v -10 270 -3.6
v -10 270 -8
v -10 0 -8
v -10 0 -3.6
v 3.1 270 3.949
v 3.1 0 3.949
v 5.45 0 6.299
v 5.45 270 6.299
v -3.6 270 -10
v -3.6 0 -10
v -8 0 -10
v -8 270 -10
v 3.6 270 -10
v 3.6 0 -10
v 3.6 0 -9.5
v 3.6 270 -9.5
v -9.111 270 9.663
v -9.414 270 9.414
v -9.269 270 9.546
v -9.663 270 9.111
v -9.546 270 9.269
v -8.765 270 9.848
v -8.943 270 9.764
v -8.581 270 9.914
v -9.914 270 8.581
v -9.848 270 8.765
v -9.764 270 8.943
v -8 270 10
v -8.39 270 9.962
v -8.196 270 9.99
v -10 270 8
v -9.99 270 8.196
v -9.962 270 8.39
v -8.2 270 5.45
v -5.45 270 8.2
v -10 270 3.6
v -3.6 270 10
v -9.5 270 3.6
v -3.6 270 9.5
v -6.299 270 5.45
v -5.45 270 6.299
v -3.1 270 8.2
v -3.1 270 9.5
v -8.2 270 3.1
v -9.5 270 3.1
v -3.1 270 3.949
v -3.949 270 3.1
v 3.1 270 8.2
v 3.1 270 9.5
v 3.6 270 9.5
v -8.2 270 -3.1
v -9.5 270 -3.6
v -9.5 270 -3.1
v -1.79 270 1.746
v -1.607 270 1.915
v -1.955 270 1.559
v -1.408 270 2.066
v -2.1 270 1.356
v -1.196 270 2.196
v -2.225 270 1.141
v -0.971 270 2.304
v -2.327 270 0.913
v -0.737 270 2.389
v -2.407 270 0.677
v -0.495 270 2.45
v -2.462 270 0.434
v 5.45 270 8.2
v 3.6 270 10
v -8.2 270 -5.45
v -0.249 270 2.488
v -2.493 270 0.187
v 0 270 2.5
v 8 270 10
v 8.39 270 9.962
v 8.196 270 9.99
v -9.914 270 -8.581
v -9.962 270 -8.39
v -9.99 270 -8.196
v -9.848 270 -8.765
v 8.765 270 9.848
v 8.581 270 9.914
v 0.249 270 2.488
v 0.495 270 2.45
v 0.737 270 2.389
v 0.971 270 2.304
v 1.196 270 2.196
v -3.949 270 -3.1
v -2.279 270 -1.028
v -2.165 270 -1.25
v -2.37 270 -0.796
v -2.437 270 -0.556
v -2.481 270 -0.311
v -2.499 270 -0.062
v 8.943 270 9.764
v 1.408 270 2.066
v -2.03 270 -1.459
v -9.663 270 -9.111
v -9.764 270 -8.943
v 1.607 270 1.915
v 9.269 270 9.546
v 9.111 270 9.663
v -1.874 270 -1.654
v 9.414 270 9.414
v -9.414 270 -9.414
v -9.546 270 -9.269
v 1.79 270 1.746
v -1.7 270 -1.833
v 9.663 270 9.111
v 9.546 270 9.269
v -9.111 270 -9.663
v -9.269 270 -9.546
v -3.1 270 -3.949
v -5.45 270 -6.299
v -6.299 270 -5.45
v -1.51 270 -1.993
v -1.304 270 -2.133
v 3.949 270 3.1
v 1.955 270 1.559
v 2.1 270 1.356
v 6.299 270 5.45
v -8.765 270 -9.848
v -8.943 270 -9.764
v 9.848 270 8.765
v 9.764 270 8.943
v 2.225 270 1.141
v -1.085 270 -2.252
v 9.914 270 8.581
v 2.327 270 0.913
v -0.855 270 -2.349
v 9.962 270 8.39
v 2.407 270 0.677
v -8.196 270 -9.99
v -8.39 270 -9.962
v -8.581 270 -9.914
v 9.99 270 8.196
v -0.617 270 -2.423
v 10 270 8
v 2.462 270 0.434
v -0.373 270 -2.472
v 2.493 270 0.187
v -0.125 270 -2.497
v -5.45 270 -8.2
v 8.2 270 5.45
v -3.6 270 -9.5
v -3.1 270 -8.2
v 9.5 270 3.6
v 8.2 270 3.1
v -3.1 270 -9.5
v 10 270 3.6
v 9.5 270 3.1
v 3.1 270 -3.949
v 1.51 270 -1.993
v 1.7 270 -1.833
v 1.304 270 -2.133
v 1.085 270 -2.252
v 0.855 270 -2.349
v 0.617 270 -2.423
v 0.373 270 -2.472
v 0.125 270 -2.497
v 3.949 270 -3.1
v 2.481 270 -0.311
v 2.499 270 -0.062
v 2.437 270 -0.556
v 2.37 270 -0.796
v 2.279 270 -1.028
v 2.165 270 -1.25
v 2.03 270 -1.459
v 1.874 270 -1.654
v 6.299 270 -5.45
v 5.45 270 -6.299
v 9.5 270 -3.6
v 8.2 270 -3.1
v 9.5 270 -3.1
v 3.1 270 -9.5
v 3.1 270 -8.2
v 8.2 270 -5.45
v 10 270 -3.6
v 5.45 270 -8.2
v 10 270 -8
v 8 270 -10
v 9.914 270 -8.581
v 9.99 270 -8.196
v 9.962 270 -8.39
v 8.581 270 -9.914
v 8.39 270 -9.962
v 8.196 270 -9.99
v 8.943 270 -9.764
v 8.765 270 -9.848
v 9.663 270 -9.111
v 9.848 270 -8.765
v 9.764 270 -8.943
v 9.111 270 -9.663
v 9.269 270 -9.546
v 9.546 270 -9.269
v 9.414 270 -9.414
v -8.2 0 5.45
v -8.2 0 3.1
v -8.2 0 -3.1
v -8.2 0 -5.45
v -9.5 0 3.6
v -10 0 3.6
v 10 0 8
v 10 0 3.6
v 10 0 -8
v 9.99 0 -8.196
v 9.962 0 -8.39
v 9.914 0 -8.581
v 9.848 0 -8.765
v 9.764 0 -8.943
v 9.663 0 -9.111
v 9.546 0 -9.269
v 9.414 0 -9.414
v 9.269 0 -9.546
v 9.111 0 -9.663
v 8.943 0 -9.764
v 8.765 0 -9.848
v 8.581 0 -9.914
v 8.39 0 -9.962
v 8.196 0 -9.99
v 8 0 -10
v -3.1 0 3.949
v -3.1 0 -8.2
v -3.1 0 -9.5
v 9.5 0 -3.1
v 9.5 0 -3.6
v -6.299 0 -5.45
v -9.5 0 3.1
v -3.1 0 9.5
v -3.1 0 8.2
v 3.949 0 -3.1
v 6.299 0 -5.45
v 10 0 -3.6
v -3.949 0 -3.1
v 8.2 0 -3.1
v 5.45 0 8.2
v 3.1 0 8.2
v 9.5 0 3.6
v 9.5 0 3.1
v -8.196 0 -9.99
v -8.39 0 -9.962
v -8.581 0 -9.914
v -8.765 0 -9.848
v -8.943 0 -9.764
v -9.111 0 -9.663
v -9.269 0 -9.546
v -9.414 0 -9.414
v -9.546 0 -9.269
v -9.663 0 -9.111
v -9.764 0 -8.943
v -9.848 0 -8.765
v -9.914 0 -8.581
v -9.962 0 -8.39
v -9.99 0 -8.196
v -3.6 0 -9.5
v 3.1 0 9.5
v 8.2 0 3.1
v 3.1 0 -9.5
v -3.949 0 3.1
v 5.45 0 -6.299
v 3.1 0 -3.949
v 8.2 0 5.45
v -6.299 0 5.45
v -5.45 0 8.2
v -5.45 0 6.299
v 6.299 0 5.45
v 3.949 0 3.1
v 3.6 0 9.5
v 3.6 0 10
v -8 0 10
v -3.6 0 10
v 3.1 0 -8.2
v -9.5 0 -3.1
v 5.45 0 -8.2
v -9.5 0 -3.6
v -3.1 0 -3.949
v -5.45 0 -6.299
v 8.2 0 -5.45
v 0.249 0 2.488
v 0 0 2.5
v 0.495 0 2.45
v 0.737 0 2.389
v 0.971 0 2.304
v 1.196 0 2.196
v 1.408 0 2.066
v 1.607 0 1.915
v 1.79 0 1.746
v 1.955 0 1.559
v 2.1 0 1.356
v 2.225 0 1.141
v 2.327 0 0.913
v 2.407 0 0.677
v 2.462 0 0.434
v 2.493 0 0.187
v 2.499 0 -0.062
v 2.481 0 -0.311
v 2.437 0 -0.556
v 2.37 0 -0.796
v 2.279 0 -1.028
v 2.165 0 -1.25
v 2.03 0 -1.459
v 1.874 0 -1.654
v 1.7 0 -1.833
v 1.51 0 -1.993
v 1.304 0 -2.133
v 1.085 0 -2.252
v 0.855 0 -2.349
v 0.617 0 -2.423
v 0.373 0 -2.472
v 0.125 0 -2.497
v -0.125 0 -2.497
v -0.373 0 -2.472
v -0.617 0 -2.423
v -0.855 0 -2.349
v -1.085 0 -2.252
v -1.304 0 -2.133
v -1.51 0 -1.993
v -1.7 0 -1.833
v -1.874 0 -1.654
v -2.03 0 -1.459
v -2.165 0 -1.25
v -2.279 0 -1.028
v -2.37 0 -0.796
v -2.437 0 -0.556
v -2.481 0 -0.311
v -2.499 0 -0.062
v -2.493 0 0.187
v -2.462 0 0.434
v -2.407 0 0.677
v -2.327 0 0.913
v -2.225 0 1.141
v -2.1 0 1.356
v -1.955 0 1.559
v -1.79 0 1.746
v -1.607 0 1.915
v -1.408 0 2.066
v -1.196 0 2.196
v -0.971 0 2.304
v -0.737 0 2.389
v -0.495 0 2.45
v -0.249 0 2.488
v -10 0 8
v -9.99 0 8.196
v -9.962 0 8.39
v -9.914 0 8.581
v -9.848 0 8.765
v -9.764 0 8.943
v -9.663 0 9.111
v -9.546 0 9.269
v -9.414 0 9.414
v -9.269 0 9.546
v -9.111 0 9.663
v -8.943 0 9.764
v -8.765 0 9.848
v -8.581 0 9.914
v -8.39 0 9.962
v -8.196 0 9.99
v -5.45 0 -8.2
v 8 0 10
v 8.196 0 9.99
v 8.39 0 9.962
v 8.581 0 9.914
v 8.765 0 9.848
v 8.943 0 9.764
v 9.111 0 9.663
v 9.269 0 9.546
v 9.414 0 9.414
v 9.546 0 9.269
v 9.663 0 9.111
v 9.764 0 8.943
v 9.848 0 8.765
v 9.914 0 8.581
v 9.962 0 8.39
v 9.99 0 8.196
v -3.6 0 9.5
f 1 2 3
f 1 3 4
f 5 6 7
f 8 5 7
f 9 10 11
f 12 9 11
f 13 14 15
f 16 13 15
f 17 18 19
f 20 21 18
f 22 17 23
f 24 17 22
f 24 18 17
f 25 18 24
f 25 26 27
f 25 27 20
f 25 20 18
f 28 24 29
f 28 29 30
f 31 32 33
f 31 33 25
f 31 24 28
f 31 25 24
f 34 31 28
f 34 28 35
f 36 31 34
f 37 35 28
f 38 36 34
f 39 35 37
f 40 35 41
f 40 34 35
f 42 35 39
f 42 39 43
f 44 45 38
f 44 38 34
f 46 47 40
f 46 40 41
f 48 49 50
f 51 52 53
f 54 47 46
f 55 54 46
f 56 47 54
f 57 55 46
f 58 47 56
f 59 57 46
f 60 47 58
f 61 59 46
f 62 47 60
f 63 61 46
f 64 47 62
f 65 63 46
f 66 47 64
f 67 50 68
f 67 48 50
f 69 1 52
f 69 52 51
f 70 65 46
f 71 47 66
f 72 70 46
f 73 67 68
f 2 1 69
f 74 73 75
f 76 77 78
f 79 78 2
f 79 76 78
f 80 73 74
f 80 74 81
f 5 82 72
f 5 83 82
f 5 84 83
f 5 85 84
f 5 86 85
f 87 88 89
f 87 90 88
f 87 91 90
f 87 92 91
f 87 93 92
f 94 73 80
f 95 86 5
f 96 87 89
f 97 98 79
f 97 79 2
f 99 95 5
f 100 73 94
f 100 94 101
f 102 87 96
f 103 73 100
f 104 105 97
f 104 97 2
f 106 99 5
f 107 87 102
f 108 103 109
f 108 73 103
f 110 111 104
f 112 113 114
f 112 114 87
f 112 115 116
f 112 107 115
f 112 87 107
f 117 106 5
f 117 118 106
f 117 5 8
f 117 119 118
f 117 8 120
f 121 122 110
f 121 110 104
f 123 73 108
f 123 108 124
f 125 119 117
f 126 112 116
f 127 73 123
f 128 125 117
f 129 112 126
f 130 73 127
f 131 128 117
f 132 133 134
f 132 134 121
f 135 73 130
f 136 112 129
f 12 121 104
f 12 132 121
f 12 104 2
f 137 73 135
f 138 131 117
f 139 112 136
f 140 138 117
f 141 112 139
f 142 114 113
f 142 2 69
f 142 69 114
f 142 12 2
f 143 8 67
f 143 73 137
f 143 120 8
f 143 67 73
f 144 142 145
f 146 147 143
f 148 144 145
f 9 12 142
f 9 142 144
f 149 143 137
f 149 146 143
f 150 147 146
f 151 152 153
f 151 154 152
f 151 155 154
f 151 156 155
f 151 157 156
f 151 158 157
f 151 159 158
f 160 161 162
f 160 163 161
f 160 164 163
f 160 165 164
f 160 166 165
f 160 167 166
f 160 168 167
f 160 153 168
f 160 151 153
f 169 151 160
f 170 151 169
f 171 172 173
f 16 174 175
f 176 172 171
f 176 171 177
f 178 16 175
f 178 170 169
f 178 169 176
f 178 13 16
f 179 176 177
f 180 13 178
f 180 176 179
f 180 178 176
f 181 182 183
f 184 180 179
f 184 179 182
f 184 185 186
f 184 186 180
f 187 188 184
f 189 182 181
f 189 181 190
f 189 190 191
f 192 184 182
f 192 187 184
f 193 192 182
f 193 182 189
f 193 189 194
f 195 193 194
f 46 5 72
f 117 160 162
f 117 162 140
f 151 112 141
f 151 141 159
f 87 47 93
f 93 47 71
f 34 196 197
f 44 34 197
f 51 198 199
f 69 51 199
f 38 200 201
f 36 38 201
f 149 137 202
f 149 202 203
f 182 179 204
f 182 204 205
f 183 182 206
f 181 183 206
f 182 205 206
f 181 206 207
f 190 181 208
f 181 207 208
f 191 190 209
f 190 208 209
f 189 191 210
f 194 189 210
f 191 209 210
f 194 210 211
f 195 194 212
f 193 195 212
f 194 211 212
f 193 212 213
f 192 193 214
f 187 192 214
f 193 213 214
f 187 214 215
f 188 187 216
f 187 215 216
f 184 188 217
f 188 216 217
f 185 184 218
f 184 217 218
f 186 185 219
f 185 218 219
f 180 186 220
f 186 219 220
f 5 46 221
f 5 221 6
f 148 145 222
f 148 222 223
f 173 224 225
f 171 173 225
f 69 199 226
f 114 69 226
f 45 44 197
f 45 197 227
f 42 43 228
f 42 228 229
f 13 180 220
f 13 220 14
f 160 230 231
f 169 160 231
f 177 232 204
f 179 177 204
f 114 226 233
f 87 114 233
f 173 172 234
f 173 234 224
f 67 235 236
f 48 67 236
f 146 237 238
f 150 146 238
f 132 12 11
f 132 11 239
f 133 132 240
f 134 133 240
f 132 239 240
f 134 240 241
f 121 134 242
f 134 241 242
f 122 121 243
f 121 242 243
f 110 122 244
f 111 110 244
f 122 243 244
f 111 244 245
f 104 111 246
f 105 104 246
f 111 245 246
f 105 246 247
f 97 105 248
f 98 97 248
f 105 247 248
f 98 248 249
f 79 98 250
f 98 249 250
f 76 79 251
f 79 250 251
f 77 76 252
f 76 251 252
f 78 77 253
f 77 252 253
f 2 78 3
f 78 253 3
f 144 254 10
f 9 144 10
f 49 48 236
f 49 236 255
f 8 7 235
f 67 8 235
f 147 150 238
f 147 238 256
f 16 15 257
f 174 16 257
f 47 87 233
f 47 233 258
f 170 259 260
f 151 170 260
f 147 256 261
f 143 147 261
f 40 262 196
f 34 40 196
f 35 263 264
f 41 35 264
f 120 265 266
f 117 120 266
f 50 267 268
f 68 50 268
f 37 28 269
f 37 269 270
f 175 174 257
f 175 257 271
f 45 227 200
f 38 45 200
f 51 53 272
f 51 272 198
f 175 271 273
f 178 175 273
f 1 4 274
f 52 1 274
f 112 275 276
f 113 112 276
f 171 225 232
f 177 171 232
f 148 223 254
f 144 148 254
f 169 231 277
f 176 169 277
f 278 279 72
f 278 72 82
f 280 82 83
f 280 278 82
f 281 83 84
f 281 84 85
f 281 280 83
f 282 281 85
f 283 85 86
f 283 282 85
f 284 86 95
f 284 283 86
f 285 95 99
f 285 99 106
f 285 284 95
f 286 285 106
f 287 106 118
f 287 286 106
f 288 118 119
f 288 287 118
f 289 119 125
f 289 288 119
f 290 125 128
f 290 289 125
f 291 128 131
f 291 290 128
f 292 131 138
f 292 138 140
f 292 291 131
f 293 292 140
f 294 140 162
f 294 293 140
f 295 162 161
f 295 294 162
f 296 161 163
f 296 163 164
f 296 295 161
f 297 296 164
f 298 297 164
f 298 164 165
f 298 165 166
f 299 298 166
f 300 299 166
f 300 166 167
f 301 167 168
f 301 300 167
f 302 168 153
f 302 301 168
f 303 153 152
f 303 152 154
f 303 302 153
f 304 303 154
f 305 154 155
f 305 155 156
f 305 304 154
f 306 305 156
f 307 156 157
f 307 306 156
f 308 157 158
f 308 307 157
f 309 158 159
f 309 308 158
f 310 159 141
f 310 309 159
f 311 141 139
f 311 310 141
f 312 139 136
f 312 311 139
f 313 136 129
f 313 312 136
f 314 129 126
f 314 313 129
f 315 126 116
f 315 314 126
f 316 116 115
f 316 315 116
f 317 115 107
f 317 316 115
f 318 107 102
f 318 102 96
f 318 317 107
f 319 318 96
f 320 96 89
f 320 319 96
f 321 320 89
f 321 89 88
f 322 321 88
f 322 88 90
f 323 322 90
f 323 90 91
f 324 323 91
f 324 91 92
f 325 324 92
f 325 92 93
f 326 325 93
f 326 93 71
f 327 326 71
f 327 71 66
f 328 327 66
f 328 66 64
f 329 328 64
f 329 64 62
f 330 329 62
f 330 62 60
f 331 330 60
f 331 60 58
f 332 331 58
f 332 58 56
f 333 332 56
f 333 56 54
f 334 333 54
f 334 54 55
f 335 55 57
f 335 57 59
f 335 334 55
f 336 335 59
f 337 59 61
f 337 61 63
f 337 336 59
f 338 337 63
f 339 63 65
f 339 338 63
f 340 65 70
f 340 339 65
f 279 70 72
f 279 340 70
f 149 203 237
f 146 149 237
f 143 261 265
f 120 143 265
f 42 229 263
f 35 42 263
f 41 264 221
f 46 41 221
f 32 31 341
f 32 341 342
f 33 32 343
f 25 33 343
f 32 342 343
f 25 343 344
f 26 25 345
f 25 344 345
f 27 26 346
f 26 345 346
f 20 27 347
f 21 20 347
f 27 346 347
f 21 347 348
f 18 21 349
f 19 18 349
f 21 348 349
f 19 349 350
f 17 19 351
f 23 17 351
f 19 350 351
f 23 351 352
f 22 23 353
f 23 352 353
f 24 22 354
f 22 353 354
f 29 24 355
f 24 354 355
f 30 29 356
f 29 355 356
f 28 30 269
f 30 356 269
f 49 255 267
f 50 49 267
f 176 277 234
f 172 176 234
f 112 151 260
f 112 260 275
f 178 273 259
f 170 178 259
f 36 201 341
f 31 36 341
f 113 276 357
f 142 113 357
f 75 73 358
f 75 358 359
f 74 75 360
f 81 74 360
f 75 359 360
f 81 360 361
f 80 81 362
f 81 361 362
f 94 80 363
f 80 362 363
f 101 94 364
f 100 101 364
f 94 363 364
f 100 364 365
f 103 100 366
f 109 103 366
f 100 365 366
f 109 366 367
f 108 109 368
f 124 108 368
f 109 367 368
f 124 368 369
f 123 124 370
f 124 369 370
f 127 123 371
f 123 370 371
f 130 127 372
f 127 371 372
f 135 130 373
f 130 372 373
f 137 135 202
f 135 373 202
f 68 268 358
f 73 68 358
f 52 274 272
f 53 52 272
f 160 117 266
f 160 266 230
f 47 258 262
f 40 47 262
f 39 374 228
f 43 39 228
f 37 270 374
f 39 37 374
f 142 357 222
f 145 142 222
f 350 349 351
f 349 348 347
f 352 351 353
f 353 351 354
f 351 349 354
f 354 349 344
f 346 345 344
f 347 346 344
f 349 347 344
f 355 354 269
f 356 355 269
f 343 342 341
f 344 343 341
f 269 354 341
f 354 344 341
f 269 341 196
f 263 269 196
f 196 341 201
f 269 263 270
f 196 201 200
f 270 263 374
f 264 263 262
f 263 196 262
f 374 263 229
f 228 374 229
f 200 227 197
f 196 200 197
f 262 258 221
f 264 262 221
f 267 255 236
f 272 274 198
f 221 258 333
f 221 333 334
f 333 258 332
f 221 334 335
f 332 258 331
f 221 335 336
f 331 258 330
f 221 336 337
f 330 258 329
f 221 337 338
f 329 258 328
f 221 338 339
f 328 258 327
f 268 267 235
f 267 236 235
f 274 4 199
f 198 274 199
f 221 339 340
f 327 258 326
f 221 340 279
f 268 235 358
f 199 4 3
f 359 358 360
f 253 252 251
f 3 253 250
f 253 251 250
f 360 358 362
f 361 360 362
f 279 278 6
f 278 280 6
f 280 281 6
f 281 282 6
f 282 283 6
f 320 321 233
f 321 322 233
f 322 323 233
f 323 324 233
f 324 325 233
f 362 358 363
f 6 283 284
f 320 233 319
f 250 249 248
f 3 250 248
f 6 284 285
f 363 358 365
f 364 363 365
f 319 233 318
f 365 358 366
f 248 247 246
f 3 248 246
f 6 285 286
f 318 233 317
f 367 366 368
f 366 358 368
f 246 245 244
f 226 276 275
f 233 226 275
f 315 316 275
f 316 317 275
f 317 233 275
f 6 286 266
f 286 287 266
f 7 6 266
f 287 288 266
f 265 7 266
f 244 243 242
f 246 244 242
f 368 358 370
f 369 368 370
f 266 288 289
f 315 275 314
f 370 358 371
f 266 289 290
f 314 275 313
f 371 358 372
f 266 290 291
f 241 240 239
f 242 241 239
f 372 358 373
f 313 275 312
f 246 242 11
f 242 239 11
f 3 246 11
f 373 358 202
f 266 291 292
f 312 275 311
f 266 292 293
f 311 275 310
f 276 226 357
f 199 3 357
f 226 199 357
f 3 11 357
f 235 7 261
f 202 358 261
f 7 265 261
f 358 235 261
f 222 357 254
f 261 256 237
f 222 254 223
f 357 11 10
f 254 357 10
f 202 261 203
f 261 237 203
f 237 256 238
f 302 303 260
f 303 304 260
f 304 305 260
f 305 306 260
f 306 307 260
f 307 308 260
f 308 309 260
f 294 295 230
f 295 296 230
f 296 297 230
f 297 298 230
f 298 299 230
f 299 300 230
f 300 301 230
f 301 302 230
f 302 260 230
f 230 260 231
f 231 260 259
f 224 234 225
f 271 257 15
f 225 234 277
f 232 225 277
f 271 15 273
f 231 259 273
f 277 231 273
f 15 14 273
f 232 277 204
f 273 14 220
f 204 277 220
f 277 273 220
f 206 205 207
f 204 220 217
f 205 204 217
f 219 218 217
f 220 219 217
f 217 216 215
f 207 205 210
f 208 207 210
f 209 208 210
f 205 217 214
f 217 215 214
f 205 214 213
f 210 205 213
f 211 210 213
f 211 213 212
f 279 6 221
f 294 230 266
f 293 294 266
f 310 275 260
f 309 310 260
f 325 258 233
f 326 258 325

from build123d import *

# Parameters (mm, degrees)
SKETCH_1_R      = 2.5
EXTRUDE_1_DEPTH = 270


with BuildPart() as part:
    # 草图1 → 凸台-拉伸1 (new body)
    with BuildSketch(Plane(origin=(0, 0, 0), x_dir=(1, 0, 0), z_dir=(0, 1, 0))):
        with BuildLine():
            Line((-3.948528137, -3.1), (-6.298528137, -5.45))
            Line((-6.298528137, -5.45), (-8.2, -5.45))
            Line((-8.2, -5.45), (-8.2, -3.1))
            Line((-8.2, -3.1), (-9.5, -3.1))
            Line((-9.5, -3.1), (-9.5, -3.6))
            Line((-9.5, -3.6), (-10, -3.6))
            Line((-10, -3.6), (-10, -8))
            ThreePointArc((-10, -8), (-9.414213562, -9.414213562), (-8, -10))
            Line((-8, -10), (-3.6, -10))
            Line((-3.6, -10), (-3.6, -9.5))
            Line((-3.6, -9.5), (-3.1, -9.5))
            Line((-3.1, -9.5), (-3.1, -8.2))
            Line((-3.1, -8.2), (-5.45, -8.2))
            Line((-5.45, -8.2), (-5.45, -6.298528137))
            Line((-5.45, -6.298528137), (-3.1, -3.948528137))
            Line((-3.1, -3.948528137), (0, -3.948528137))
            Line((0, -3.948528137), (3.1, -3.948528137))
            Line((3.1, -3.948528137), (5.45, -6.298528137))
            Line((5.45, -6.298528137), (5.45, -8.2))
            Line((5.45, -8.2), (3.1, -8.2))
            Line((3.1, -8.2), (3.1, -9.5))
            Line((3.1, -9.5), (3.6, -9.5))
            Line((3.6, -9.5), (3.6, -10))
            Line((3.6, -10), (8, -10))
            ThreePointArc((8, -10), (9.414213562, -9.414213562), (10, -8))
            Line((10, -8), (10, -3.6))
            Line((10, -3.6), (9.5, -3.6))
            Line((9.5, -3.6), (9.5, -3.1))
            Line((9.5, -3.1), (8.2, -3.1))
            Line((8.2, -3.1), (8.2, -5.45))
            Line((8.2, -5.45), (6.298528137, -5.45))
            Line((6.298528137, -5.45), (3.948528137, -3.1))
            Line((3.948528137, -3.1), (3.948528137, 0))
            Line((3.948528137, 0), (3.948528137, 3.1))
            Line((3.948528137, 3.1), (6.298528137, 5.45))
            Line((6.298528137, 5.45), (8.2, 5.45))
            Line((8.2, 5.45), (8.2, 3.1))
            Line((8.2, 3.1), (9.5, 3.1))
            Line((9.5, 3.1), (9.5, 3.6))
            Line((9.5, 3.6), (10, 3.6))
            Line((10, 3.6), (10, 8))
            ThreePointArc((10, 8), (9.414213562, 9.414213562), (8, 10))
            Line((8, 10), (3.6, 10))
            Line((3.6, 10), (3.6, 9.5))
            Line((3.6, 9.5), (3.1, 9.5))
            Line((3.1, 9.5), (3.1, 8.2))
            Line((3.1, 8.2), (5.45, 8.2))
            Line((5.45, 8.2), (5.45, 6.298528137))
            Line((5.45, 6.298528137), (3.1, 3.948528137))
            Line((3.1, 3.948528137), (0, 3.948528137))
            Line((0, 3.948528137), (-3.1, 3.948528137))
            Line((-3.1, 3.948528137), (-5.45, 6.298528137))
            Line((-5.45, 6.298528137), (-5.45, 8.2))
            Line((-5.45, 8.2), (-3.1, 8.2))
            Line((-3.1, 8.2), (-3.1, 9.5))
            Line((-3.1, 9.5), (-3.6, 9.5))
            Line((-3.6, 9.5), (-3.6, 10))
            Line((-3.6, 10), (-8, 10))
            ThreePointArc((-8, 10), (-9.414213562, 9.414213562), (-10, 8))
            Line((-10, 8), (-10, 3.6))
            Line((-10, 3.6), (-9.5, 3.6))
            Line((-9.5, 3.6), (-9.5, 3.1))
            Line((-9.5, 3.1), (-8.2, 3.1))
            Line((-8.2, 3.1), (-8.2, 5.45))
            Line((-8.2, 5.45), (-6.298528137, 5.45))
            Line((-6.298528137, 5.45), (-3.948528137, 3.1))
            Line((-3.948528137, 3.1), (-3.948528137, 0))
            Line((-3.948528137, 0), (-3.948528137, -3.1))
        make_face()
        with Locations(Location((0, 0, 0), (0, 0, 270))):
            Circle(SKETCH_1_R, mode=Mode.SUBTRACT)
    extrude(amount=EXTRUDE_1_DEPTH)


solid = part.part
